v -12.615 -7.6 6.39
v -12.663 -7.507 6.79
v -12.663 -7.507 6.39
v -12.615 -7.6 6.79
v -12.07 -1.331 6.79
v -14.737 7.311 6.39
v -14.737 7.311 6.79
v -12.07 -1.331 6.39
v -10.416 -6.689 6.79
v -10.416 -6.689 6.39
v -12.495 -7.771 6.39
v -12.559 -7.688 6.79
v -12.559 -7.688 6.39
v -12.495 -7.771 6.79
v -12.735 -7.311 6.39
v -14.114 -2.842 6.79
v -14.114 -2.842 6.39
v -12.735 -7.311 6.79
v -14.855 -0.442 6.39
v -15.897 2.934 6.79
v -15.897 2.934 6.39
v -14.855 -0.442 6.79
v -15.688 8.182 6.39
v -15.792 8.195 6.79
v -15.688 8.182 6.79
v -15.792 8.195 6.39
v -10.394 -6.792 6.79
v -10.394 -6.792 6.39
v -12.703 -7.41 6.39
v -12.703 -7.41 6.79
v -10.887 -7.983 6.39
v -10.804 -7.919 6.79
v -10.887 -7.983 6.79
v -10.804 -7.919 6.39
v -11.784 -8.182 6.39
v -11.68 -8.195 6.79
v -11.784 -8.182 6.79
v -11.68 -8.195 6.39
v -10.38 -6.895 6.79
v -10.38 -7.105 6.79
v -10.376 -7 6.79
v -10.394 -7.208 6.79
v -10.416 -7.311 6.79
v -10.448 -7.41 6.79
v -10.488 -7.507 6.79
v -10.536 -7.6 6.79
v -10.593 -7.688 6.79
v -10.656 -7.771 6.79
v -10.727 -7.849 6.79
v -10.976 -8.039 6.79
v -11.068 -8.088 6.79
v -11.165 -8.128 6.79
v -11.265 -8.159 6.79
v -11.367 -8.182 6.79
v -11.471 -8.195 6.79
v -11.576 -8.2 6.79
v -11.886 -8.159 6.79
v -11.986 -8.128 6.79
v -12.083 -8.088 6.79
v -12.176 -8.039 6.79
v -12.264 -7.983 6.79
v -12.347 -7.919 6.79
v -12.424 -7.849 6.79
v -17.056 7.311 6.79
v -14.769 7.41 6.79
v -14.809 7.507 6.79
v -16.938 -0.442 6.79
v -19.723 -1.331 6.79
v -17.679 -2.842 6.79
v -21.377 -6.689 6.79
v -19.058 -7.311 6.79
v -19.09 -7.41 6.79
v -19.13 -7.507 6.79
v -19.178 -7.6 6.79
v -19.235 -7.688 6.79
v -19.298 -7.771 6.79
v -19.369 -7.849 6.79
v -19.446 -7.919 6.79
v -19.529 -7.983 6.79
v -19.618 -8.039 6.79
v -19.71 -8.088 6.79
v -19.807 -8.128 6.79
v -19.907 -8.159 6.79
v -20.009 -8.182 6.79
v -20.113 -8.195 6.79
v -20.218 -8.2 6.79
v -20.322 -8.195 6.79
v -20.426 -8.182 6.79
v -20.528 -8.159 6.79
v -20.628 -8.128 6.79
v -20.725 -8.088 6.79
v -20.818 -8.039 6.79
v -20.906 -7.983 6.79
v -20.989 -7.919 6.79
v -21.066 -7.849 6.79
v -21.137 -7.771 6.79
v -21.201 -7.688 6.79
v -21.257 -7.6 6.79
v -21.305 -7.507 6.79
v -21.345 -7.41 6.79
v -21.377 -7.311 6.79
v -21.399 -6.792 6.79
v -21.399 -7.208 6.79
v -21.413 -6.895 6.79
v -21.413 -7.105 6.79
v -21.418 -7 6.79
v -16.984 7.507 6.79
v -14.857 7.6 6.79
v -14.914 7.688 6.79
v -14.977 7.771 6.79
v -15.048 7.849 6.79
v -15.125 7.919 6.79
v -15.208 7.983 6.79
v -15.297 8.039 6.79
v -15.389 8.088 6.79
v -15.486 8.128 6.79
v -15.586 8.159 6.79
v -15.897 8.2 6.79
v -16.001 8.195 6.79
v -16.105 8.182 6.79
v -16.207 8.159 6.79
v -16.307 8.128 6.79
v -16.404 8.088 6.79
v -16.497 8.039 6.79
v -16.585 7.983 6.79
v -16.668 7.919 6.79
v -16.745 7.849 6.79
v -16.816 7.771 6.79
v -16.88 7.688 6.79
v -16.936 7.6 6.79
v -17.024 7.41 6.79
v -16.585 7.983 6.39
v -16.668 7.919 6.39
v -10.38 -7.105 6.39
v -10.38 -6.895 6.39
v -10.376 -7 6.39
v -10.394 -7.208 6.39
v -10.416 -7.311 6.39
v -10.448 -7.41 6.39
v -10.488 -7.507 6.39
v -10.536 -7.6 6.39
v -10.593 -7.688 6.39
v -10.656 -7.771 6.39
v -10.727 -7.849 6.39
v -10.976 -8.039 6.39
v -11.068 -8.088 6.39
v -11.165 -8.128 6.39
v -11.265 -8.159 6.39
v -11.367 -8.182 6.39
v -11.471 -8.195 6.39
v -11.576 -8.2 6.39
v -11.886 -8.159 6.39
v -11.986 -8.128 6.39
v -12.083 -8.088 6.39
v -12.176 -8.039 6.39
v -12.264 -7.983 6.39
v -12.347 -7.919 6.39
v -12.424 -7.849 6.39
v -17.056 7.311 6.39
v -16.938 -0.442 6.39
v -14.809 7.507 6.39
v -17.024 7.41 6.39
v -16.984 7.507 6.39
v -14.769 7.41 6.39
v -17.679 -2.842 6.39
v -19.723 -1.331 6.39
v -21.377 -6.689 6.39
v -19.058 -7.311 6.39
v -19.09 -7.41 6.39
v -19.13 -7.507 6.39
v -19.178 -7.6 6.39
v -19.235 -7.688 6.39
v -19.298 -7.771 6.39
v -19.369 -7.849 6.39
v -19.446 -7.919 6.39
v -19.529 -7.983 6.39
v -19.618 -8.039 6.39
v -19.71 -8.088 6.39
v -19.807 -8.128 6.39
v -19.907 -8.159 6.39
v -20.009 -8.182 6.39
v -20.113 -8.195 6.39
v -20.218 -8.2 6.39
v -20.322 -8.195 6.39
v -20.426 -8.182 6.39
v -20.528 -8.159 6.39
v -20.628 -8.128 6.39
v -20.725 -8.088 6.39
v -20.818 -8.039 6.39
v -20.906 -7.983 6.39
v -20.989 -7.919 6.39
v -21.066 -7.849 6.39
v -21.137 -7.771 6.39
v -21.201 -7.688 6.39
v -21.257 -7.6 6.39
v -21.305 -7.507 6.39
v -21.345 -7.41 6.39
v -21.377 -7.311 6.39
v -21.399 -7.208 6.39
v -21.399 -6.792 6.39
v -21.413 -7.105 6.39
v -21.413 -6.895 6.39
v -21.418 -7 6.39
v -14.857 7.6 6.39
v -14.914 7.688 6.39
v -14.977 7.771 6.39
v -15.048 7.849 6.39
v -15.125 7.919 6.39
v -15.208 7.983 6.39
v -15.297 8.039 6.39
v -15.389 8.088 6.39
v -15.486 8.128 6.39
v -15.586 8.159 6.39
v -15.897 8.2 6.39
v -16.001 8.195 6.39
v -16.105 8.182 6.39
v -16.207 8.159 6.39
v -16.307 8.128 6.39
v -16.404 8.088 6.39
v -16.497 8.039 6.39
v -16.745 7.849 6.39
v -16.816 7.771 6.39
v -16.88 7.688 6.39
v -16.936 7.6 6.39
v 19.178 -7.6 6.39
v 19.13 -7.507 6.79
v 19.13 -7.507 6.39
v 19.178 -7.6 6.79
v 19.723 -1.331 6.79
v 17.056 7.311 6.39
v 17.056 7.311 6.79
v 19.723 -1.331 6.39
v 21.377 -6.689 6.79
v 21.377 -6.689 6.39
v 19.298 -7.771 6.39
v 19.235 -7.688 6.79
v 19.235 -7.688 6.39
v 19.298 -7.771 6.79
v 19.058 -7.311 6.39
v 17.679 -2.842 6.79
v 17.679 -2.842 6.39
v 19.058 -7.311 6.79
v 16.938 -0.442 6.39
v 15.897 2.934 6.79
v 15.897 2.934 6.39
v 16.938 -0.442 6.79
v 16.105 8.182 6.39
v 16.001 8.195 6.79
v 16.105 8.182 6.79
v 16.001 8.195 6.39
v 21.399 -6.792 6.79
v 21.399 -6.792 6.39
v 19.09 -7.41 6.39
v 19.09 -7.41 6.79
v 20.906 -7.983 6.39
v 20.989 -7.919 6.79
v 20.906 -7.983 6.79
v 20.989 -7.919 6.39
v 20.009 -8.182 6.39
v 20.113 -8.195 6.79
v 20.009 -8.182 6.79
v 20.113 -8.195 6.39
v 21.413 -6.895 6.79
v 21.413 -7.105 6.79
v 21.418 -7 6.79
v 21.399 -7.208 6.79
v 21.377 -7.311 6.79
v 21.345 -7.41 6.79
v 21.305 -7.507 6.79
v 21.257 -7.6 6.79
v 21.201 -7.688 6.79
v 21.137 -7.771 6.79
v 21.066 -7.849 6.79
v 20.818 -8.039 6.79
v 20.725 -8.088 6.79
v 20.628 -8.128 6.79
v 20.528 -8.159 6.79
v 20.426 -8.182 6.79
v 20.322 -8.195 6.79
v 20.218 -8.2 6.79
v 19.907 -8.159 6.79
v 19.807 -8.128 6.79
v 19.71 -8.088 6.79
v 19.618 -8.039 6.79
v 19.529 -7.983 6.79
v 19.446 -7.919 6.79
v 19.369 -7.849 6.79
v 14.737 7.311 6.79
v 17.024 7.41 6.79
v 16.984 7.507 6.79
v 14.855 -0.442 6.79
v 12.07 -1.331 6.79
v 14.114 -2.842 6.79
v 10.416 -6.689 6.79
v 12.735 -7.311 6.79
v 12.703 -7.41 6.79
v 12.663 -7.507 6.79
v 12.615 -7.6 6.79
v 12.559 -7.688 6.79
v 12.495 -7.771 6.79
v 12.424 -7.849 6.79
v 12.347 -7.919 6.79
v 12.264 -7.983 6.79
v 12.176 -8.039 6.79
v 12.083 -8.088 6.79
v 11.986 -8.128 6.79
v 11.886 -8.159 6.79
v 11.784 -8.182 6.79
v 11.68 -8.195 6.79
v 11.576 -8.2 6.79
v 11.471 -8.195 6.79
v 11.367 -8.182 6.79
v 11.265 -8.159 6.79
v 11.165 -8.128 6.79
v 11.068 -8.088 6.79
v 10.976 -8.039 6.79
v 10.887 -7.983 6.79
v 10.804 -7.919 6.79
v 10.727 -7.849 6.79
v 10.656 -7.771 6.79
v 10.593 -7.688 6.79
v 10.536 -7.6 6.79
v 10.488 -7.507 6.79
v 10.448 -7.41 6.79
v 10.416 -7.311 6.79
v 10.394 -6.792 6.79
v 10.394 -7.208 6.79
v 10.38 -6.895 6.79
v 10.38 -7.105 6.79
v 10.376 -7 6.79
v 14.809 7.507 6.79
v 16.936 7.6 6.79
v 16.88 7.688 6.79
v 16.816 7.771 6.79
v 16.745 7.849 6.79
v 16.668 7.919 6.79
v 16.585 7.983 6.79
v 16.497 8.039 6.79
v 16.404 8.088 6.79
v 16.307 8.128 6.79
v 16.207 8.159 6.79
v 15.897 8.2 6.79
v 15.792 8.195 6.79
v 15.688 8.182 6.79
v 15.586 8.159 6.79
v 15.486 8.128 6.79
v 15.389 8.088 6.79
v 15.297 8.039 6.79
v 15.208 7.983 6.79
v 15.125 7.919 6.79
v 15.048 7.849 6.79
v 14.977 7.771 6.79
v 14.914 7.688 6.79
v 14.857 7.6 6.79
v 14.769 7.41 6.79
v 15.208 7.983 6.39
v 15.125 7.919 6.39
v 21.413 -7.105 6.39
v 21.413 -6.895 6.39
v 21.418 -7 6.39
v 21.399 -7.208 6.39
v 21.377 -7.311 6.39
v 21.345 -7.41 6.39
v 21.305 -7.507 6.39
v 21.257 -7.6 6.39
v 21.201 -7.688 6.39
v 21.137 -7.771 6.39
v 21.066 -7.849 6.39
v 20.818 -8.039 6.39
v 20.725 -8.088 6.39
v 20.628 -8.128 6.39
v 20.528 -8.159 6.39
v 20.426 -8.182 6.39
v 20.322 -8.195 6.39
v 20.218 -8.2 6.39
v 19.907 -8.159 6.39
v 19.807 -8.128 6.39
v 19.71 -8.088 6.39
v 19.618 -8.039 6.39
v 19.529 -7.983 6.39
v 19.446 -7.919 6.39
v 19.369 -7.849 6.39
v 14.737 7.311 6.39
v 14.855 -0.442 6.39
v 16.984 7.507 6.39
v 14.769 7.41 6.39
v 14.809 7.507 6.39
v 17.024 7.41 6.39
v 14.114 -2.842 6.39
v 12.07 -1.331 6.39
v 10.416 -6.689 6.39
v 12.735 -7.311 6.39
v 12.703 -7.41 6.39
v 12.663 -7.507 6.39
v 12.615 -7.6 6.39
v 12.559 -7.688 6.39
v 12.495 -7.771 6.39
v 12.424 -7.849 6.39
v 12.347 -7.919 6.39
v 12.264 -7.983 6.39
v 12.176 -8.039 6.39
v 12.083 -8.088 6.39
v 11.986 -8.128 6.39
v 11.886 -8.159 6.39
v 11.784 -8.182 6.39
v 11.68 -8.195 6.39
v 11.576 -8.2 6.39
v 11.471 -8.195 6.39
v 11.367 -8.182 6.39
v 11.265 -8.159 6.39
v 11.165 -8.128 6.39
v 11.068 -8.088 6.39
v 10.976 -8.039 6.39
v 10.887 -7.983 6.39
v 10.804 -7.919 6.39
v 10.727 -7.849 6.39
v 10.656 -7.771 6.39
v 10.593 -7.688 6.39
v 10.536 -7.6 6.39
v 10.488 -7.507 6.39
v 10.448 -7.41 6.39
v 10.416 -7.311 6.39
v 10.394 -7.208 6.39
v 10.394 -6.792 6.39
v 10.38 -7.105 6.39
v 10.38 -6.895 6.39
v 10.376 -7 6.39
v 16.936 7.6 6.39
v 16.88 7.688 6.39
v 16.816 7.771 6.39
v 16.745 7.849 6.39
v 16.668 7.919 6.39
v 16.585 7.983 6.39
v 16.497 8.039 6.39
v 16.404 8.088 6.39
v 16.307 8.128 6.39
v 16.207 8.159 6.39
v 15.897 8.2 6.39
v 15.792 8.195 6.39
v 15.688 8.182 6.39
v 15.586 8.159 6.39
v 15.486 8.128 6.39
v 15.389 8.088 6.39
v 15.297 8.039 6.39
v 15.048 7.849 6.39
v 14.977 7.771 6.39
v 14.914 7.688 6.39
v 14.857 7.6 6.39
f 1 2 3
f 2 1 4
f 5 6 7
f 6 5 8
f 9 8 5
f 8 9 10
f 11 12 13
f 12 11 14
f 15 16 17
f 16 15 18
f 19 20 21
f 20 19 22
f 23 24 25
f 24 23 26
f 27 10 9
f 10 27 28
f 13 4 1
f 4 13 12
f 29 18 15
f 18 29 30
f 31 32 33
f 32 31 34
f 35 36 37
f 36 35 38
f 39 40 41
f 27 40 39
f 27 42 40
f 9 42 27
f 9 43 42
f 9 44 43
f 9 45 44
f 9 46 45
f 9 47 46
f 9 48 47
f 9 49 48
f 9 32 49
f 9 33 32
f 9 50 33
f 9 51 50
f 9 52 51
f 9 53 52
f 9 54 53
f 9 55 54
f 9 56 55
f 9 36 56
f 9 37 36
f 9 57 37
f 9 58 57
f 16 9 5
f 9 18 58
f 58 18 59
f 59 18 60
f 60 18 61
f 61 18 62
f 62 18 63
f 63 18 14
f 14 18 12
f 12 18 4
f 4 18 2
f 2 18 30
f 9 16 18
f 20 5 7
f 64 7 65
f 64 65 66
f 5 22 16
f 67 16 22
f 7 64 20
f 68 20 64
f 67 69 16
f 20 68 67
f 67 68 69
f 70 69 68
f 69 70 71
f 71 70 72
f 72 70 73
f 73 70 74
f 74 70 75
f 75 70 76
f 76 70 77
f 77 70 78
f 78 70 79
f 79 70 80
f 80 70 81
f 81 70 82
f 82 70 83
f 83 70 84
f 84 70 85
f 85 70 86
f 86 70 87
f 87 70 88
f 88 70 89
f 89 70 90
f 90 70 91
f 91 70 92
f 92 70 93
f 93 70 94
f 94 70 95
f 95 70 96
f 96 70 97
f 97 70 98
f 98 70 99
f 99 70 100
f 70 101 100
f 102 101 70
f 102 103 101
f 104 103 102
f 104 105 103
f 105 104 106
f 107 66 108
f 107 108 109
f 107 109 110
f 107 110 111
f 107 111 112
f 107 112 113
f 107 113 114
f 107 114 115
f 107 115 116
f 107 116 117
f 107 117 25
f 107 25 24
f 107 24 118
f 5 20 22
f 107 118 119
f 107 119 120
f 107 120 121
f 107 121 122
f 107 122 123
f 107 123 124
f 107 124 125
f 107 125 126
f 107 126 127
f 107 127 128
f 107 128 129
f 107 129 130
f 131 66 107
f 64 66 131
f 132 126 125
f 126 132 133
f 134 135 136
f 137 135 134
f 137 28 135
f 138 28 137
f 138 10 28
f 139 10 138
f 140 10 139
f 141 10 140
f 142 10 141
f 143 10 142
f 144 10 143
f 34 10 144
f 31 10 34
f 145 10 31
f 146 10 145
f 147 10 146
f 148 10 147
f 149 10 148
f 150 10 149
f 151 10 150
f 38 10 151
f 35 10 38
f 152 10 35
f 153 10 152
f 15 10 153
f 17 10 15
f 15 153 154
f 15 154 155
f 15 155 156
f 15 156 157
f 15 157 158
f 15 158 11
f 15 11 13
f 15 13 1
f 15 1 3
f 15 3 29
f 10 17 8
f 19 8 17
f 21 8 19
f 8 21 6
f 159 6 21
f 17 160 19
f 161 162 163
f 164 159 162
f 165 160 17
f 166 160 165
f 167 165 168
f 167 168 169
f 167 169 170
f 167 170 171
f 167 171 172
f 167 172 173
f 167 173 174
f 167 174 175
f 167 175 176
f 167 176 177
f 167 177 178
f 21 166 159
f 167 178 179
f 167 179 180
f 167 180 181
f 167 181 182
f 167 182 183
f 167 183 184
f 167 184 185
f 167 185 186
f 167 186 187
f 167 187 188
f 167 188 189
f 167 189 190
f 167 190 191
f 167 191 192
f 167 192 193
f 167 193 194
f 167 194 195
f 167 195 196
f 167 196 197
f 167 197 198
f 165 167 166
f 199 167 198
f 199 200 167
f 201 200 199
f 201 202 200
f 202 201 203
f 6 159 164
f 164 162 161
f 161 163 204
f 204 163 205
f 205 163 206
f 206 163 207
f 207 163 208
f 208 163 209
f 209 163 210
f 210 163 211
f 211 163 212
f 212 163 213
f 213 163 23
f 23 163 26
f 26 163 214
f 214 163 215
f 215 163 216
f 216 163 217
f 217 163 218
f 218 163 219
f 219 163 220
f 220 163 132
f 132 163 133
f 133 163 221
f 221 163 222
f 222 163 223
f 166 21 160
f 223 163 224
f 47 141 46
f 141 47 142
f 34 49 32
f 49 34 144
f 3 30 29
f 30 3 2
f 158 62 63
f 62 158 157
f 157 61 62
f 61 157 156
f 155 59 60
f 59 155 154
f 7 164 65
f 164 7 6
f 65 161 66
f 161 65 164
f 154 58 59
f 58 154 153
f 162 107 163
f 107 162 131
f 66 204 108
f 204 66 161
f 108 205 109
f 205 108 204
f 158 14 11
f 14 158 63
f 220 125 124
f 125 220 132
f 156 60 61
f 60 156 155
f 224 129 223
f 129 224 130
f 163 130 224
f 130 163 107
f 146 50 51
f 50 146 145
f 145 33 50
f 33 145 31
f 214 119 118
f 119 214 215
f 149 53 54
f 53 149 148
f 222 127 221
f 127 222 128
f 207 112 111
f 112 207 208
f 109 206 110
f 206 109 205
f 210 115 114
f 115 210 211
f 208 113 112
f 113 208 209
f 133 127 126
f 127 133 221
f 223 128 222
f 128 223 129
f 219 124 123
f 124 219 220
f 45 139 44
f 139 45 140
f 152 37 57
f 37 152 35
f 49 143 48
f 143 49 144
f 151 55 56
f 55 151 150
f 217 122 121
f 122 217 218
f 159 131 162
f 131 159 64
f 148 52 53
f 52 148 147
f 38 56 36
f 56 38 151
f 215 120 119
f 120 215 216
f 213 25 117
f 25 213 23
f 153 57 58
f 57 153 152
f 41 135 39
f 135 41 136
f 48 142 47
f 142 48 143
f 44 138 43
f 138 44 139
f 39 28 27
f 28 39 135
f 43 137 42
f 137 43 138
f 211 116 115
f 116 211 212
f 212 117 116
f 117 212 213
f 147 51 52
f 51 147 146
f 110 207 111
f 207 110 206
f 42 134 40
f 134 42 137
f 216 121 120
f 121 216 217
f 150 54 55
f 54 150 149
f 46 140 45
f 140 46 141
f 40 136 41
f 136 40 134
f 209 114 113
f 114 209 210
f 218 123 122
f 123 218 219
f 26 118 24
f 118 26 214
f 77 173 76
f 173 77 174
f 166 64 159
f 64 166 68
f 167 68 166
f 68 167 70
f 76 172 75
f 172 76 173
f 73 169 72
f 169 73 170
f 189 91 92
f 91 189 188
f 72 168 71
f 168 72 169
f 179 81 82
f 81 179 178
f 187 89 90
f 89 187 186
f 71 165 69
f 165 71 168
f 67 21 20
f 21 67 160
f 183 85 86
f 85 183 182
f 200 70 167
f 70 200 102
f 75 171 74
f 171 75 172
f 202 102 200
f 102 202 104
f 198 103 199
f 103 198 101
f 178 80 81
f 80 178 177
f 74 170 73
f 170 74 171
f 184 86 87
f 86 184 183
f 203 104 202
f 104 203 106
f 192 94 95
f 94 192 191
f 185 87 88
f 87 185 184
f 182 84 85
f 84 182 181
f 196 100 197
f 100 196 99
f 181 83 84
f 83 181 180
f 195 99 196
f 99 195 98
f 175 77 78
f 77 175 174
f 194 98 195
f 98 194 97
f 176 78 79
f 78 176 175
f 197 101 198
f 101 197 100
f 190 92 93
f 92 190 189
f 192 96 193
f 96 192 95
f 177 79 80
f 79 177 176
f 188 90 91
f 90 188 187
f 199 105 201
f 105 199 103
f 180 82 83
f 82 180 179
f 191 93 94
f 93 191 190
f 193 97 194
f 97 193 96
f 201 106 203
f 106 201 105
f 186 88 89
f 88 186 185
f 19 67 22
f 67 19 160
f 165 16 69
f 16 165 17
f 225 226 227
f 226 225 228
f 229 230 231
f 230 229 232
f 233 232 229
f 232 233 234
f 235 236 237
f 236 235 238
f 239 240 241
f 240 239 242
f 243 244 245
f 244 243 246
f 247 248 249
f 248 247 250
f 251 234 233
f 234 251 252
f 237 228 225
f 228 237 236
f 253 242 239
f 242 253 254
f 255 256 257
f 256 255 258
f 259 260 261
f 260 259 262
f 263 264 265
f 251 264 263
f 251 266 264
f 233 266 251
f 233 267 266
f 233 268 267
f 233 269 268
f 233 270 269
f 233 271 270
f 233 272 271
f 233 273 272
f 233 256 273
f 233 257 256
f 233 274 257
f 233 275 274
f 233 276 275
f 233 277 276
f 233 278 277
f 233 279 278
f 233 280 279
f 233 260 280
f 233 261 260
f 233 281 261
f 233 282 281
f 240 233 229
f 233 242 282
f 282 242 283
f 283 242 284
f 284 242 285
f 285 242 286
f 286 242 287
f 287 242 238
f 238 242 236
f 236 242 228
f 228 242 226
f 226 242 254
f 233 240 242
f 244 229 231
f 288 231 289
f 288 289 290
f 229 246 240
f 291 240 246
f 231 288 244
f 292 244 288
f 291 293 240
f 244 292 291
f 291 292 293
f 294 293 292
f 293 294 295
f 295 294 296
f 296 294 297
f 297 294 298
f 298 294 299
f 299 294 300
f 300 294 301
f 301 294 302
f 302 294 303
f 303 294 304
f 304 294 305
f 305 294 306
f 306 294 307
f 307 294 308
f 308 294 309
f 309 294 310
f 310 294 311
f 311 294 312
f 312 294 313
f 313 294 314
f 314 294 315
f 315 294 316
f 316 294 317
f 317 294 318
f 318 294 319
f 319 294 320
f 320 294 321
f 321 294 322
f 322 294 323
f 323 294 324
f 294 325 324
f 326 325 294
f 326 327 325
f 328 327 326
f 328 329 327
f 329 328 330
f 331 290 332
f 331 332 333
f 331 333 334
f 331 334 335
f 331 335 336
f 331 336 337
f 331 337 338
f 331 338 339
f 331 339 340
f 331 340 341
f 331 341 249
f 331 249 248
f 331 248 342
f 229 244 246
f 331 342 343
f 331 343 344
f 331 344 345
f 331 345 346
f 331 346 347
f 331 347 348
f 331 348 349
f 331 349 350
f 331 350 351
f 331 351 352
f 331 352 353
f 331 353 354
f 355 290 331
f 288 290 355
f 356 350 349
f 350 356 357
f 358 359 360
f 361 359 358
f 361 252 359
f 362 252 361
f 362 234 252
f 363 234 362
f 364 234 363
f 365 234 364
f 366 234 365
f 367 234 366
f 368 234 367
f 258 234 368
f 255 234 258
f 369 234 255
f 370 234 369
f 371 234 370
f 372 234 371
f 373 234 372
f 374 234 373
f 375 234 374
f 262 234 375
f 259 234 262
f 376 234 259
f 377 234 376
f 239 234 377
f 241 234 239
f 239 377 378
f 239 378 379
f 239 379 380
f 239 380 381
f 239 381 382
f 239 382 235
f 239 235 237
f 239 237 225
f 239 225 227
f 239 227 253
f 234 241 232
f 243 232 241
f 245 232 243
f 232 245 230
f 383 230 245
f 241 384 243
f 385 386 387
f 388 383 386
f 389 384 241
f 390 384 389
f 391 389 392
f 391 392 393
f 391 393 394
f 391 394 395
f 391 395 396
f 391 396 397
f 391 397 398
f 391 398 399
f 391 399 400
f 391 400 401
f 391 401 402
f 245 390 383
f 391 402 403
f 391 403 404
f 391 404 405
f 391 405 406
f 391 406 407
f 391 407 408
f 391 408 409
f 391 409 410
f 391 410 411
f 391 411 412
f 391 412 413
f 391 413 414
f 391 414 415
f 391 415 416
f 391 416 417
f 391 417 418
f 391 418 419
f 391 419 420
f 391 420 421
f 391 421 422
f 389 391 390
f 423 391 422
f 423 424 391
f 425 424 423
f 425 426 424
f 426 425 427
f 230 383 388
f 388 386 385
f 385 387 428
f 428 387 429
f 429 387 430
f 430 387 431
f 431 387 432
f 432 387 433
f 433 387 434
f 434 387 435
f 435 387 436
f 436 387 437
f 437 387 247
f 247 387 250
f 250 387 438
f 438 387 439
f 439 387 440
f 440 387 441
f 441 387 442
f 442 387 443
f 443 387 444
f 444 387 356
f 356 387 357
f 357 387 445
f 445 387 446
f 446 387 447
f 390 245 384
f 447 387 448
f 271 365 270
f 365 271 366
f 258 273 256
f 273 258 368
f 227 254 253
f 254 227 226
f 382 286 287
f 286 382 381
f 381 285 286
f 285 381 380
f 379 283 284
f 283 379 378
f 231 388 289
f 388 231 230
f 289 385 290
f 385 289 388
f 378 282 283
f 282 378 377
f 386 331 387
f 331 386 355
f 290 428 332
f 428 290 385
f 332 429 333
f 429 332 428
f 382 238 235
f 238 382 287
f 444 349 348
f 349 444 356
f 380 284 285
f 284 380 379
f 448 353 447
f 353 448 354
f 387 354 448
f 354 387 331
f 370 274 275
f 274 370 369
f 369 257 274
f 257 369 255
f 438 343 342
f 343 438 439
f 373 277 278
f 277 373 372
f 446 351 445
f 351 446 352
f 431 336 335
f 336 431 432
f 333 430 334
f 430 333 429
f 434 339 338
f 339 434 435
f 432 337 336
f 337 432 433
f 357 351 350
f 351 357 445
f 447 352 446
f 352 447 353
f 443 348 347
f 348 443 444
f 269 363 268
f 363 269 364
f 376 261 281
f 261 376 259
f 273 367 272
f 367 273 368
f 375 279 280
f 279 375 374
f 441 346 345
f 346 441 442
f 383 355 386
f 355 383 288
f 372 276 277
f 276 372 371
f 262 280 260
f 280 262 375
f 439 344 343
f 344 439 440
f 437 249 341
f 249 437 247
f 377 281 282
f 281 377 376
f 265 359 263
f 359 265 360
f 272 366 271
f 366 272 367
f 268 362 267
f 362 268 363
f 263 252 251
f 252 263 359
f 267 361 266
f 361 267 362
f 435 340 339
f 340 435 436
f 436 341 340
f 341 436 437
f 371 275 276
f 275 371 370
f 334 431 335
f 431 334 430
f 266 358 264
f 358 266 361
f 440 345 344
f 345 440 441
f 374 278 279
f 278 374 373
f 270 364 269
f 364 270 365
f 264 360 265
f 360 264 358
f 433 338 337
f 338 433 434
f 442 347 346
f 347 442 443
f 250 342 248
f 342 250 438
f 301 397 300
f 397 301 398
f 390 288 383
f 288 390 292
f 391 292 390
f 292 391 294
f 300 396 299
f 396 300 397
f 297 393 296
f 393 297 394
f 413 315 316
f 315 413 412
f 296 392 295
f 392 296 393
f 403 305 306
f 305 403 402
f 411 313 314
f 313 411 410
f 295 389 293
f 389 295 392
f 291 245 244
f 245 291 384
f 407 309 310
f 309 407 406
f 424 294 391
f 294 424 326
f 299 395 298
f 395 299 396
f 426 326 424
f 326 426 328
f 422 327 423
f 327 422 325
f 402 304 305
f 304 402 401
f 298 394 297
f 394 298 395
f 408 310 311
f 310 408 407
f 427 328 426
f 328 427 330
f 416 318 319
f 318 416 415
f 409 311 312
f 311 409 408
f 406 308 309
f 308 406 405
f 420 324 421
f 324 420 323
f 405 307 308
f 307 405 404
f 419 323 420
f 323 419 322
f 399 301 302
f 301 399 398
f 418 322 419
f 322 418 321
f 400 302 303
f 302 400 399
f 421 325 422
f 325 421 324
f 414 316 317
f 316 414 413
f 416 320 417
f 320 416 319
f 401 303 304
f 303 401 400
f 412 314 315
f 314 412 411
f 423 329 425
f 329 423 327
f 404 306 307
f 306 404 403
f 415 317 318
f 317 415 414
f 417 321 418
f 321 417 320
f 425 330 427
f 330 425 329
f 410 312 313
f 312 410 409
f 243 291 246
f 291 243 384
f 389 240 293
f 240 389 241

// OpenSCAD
$fn = 72;

ltr_hgt = 14; //height of letter
ltr_line_wh = 2.4/2; //line width of letter

sqr_widh = (ltr_hgt/2+ltr_line_wh);

tag_r = sqr_widh/cos(45)+ltr_line_wh+1.6; //radius of tag
echo(tag_r);

tag_positions = [
    "CDR",
    "PLT",
    "MS1",
    "MS2",
];

tag_colors = [
    "#C4402B", //red
    "#C99B27", //yellow (gold)
    "#47BFD7", //blue (light blue)
    "#A1DA7D", //green (peak green)
];

tag_letters = [
    "A",
    "B",
    "C",
    "D",
];


/*tag_position_i = 1;
//tag_position = "PLT";
tag_color = tag_colors[tag_position_i];
tag_letter = tag_letters[tag_position_i];*/

tag_color = "#C99B27";
tag_letter = "A";

hole_r = 2.2; //radius of hole for shoelaces

tag_h1 = 0.8+2*hole_r+0.8; //hight of circle
tag_h2 = tag_h1+0.4; //height of square
tag_h3 = tag_h2+0.4; //height of letter

/* Set up parts for export using the makefile */
*/* make 'Crewmember Identification Tag A' */ for(ix=[-1,1]*(tag_r+1.5)) translate([ix,0,0]) tag_circle();
*/* make 'Crewmember Identification Tag B' */ for(ix=[-1,1]*(tag_r+1.5)) translate([ix,0,0]) tag_square();
!/* make 'Crewmember Identification Tag C' */ for(ix=[-1,1]*(tag_r+1.5)) translate([ix,0,0]) tag_letter();

//assembled view
for(ix=[-1,1]*(tag_r+1.5)) translate([ix,0,0]) {
    tag_circle();
    tag_square();
    tag_letter();
}

module tag_circle() color(tag_color) difference() {
    hull() {
        bev = 0.2;
        cylinder(r=tag_r-bev,h=tag_h1,$fn=$fn*2);
        translate([0,0,bev]) cylinder(r=tag_r,h=tag_h1-2*bev,$fn=$fn*2);
    }
    
    for(ia=[-1,1]*22.5) rotate([0,0,ia]) {
    //for(iy=[-1,1]*5) translate([0,iy,0]) {
        translate([-tag_r,0,tag_h1/2]) rotate([0,90,0]) hull() rotate([0,0,90]) cylinder_oh(hole_r,2*tag_r);
        for(ixm=[0,1]) mirror([ixm,0,0]) translate([-tag_r,0,tag_h1/2]) rotate([0,90,0]) hull() {
            bev = 0.6;
            rotate([0,0,90]) cylinder_oh(hole_r+bev,0.01);
            rotate([0,0,90]) cylinder_oh(hole_r,bev);
        }
    }
    
    rotate_extrude() {
        bev = 0.4;
        co_r = 5;
        
        translate([co_r,tag_h1/2]) circle(r=hole_r);
        polygon([
            [0,-0.01],
            [co_r+hole_r+bev,-0.01],
            [co_r+hole_r,bev],
            [co_r+hole_r,tag_h1/2],
            
            [co_r,tag_h1/2],
            [co_r+hole_r*sin(45),tag_h1/2+hole_r*cos(45)],
            [co_r+hole_r*tan(22.5),tag_h1/2+hole_r],
            
            
            [0,tag_h1/2+hole_r],
        ]);
    }
}

module tag_square() color("#111111") {
    hull() for(ix=[-1,1]*sqr_widh) for(iy=[-1,1]*sqr_widh) translate([ix,iy,tag_h1-0.01]) {
        bev = 0.2;
        cylinder(r=ltr_line_wh-bev,h=tag_h2-tag_h1);
        cylinder(r=ltr_line_wh,h=tag_h2-tag_h1-bev);
    }
}

module tag_letter() color("#E1E4E7") {
    translate([0,0,tag_h2-0.01]) letter(tag_letter,0.4);
}


module letter(ltr="A",hgt=0.4) {
    ltr_wid = ltr_hgt / 1.62;
    ltr_xhgt = ltr_hgt / 1.62;

    ltr_x = [-0.5,0.5]*ltr_wid;
    ltr_y = [-0.5,0.5]*ltr_hgt;

    ltr_y_xh = [-0.5,-0.5,0.5]*ltr_hgt+[0,1,0]*ltr_xhgt;

    if(ltr == "A") {
        for(ixm=[0,1]) mirror([ixm,0,0]) hull() {
            translate([0,ltr_hgt/2,0]) cylinder(r=ltr_line_wh,h=hgt);
            translate([ltr_wid/2,-ltr_hgt/2,0]) cylinder(r=ltr_line_wh,h=hgt);
        }
        hull() for(ixm=[0,1]) mirror([ixm,0,0]) {
            translate([ltr_wid/ltr_hgt*ltr_xhgt/2,ltr_hgt/2-ltr_xhgt,0]) cylinder(r=ltr_line_wh,h=hgt);
        }
    }

    if(ltr == "B") {
        hull() for(ix=[ltr_x[0]]) for(iy=ltr_y) translate([ix,iy,0]) cylinder(r=ltr_line_wh,h=hgt);
        
        translate([0,-ltr_hgt/2+ltr_xhgt/2,0]) rotate([0,0,-90]) rotate_extrude(angle=180) translate([ltr_xhgt/2-ltr_line_wh,0]) square([2*ltr_line_wh,hgt]);
        
        translate([0,ltr_hgt/2-(ltr_hgt-ltr_xhgt)/2,0]) rotate([0,0,-90]) rotate_extrude(angle=180) translate([(ltr_hgt-ltr_xhgt)/2-ltr_line_wh,0]) square([2*ltr_line_wh,hgt]);
        
        
        for(iy=ltr_y_xh) hull() for(ix=[ltr_x[0],0]) translate([ix,iy,0]) cylinder(r=ltr_line_wh,h=hgt);
    }

    if(ltr == "C") {
        for(iym=[0,1]) mirror([0,iym,0]) translate([0,ltr_hgt/2-ltr_wid/2,0]) rotate([0,0,15]) rotate_extrude(angle=180-15) translate([ltr_wid/2-ltr_line_wh,0]) square([2*ltr_line_wh,hgt]);
        
        hull() for(ix=[ltr_x[0]]) for(iy=[-1,1]*(ltr_hgt/2-ltr_wid/2)) translate([ix,iy,0]) cylinder(r=ltr_line_wh,h=hgt);
        
        for(ix=[0]) for(iy=[-1,1]*(ltr_hgt/2-ltr_wid/2)) translate([ix,iy,0]) rotate([0,0,sign(iy)*15]) translate([ltr_wid/2,0,0]) cylinder(r=ltr_line_wh,h=hgt);
    }

    if(ltr == "D") {
        for(iym=[0,1]) mirror([0,iym,0]) translate([0,ltr_hgt/2-ltr_wid/2,0]) rotate([0,0,0]) rotate_extrude(angle=90) translate([ltr_wid/2-ltr_line_wh,0]) square([2*ltr_line_wh,hgt]);
        
        hull() for(ix=[ltr_x[0]]) for(iy=ltr_y) translate([ix,iy,0]) cylinder(r=ltr_line_wh,h=hgt);
        hull() for(ix=[ltr_x[1]]) for(iy=[-1,1]*(ltr_hgt/2-ltr_wid/2)) translate([ix,iy,0]) cylinder(r=ltr_line_wh,h=hgt);
        
        for(iy=ltr_y) hull() for(ix=[ltr_x[0],0]) translate([ix,iy,0]) cylinder(r=ltr_line_wh,h=hgt);
    }

    if(ltr == "E") {
        hull() for(ix=[ltr_x[0]]) for(iy=ltr_y) translate([ix,iy,0]) cylinder(r=ltr_line_wh,h=hgt);
        
        for(iy=ltr_y) hull() for(ix=ltr_x) translate([ix,iy,0]) cylinder(r=ltr_line_wh,h=hgt);
        for(iy=[0]) hull() for(ix=ltr_x) translate([ix,iy,0]) cylinder(r=ltr_line_wh,h=hgt);
    }

    if(ltr == "T") {
        hull() for(ix=ltr_x) for(iy=[ltr_y[1]]) translate([ix,iy,0]) cylinder(r=ltr_line_wh,h=hgt);
        hull() for(ix=[0]) for(iy=ltr_y) translate([ix,iy,0]) cylinder(r=ltr_line_wh,h=hgt);
    }
}



module cylinder_oh(radius,height) {
    cylinder(r=radius,h=height);
    translate([-radius*tan(22.5),-radius,0]) cube([2*radius*tan(22.5),2*radius,height]);
}
